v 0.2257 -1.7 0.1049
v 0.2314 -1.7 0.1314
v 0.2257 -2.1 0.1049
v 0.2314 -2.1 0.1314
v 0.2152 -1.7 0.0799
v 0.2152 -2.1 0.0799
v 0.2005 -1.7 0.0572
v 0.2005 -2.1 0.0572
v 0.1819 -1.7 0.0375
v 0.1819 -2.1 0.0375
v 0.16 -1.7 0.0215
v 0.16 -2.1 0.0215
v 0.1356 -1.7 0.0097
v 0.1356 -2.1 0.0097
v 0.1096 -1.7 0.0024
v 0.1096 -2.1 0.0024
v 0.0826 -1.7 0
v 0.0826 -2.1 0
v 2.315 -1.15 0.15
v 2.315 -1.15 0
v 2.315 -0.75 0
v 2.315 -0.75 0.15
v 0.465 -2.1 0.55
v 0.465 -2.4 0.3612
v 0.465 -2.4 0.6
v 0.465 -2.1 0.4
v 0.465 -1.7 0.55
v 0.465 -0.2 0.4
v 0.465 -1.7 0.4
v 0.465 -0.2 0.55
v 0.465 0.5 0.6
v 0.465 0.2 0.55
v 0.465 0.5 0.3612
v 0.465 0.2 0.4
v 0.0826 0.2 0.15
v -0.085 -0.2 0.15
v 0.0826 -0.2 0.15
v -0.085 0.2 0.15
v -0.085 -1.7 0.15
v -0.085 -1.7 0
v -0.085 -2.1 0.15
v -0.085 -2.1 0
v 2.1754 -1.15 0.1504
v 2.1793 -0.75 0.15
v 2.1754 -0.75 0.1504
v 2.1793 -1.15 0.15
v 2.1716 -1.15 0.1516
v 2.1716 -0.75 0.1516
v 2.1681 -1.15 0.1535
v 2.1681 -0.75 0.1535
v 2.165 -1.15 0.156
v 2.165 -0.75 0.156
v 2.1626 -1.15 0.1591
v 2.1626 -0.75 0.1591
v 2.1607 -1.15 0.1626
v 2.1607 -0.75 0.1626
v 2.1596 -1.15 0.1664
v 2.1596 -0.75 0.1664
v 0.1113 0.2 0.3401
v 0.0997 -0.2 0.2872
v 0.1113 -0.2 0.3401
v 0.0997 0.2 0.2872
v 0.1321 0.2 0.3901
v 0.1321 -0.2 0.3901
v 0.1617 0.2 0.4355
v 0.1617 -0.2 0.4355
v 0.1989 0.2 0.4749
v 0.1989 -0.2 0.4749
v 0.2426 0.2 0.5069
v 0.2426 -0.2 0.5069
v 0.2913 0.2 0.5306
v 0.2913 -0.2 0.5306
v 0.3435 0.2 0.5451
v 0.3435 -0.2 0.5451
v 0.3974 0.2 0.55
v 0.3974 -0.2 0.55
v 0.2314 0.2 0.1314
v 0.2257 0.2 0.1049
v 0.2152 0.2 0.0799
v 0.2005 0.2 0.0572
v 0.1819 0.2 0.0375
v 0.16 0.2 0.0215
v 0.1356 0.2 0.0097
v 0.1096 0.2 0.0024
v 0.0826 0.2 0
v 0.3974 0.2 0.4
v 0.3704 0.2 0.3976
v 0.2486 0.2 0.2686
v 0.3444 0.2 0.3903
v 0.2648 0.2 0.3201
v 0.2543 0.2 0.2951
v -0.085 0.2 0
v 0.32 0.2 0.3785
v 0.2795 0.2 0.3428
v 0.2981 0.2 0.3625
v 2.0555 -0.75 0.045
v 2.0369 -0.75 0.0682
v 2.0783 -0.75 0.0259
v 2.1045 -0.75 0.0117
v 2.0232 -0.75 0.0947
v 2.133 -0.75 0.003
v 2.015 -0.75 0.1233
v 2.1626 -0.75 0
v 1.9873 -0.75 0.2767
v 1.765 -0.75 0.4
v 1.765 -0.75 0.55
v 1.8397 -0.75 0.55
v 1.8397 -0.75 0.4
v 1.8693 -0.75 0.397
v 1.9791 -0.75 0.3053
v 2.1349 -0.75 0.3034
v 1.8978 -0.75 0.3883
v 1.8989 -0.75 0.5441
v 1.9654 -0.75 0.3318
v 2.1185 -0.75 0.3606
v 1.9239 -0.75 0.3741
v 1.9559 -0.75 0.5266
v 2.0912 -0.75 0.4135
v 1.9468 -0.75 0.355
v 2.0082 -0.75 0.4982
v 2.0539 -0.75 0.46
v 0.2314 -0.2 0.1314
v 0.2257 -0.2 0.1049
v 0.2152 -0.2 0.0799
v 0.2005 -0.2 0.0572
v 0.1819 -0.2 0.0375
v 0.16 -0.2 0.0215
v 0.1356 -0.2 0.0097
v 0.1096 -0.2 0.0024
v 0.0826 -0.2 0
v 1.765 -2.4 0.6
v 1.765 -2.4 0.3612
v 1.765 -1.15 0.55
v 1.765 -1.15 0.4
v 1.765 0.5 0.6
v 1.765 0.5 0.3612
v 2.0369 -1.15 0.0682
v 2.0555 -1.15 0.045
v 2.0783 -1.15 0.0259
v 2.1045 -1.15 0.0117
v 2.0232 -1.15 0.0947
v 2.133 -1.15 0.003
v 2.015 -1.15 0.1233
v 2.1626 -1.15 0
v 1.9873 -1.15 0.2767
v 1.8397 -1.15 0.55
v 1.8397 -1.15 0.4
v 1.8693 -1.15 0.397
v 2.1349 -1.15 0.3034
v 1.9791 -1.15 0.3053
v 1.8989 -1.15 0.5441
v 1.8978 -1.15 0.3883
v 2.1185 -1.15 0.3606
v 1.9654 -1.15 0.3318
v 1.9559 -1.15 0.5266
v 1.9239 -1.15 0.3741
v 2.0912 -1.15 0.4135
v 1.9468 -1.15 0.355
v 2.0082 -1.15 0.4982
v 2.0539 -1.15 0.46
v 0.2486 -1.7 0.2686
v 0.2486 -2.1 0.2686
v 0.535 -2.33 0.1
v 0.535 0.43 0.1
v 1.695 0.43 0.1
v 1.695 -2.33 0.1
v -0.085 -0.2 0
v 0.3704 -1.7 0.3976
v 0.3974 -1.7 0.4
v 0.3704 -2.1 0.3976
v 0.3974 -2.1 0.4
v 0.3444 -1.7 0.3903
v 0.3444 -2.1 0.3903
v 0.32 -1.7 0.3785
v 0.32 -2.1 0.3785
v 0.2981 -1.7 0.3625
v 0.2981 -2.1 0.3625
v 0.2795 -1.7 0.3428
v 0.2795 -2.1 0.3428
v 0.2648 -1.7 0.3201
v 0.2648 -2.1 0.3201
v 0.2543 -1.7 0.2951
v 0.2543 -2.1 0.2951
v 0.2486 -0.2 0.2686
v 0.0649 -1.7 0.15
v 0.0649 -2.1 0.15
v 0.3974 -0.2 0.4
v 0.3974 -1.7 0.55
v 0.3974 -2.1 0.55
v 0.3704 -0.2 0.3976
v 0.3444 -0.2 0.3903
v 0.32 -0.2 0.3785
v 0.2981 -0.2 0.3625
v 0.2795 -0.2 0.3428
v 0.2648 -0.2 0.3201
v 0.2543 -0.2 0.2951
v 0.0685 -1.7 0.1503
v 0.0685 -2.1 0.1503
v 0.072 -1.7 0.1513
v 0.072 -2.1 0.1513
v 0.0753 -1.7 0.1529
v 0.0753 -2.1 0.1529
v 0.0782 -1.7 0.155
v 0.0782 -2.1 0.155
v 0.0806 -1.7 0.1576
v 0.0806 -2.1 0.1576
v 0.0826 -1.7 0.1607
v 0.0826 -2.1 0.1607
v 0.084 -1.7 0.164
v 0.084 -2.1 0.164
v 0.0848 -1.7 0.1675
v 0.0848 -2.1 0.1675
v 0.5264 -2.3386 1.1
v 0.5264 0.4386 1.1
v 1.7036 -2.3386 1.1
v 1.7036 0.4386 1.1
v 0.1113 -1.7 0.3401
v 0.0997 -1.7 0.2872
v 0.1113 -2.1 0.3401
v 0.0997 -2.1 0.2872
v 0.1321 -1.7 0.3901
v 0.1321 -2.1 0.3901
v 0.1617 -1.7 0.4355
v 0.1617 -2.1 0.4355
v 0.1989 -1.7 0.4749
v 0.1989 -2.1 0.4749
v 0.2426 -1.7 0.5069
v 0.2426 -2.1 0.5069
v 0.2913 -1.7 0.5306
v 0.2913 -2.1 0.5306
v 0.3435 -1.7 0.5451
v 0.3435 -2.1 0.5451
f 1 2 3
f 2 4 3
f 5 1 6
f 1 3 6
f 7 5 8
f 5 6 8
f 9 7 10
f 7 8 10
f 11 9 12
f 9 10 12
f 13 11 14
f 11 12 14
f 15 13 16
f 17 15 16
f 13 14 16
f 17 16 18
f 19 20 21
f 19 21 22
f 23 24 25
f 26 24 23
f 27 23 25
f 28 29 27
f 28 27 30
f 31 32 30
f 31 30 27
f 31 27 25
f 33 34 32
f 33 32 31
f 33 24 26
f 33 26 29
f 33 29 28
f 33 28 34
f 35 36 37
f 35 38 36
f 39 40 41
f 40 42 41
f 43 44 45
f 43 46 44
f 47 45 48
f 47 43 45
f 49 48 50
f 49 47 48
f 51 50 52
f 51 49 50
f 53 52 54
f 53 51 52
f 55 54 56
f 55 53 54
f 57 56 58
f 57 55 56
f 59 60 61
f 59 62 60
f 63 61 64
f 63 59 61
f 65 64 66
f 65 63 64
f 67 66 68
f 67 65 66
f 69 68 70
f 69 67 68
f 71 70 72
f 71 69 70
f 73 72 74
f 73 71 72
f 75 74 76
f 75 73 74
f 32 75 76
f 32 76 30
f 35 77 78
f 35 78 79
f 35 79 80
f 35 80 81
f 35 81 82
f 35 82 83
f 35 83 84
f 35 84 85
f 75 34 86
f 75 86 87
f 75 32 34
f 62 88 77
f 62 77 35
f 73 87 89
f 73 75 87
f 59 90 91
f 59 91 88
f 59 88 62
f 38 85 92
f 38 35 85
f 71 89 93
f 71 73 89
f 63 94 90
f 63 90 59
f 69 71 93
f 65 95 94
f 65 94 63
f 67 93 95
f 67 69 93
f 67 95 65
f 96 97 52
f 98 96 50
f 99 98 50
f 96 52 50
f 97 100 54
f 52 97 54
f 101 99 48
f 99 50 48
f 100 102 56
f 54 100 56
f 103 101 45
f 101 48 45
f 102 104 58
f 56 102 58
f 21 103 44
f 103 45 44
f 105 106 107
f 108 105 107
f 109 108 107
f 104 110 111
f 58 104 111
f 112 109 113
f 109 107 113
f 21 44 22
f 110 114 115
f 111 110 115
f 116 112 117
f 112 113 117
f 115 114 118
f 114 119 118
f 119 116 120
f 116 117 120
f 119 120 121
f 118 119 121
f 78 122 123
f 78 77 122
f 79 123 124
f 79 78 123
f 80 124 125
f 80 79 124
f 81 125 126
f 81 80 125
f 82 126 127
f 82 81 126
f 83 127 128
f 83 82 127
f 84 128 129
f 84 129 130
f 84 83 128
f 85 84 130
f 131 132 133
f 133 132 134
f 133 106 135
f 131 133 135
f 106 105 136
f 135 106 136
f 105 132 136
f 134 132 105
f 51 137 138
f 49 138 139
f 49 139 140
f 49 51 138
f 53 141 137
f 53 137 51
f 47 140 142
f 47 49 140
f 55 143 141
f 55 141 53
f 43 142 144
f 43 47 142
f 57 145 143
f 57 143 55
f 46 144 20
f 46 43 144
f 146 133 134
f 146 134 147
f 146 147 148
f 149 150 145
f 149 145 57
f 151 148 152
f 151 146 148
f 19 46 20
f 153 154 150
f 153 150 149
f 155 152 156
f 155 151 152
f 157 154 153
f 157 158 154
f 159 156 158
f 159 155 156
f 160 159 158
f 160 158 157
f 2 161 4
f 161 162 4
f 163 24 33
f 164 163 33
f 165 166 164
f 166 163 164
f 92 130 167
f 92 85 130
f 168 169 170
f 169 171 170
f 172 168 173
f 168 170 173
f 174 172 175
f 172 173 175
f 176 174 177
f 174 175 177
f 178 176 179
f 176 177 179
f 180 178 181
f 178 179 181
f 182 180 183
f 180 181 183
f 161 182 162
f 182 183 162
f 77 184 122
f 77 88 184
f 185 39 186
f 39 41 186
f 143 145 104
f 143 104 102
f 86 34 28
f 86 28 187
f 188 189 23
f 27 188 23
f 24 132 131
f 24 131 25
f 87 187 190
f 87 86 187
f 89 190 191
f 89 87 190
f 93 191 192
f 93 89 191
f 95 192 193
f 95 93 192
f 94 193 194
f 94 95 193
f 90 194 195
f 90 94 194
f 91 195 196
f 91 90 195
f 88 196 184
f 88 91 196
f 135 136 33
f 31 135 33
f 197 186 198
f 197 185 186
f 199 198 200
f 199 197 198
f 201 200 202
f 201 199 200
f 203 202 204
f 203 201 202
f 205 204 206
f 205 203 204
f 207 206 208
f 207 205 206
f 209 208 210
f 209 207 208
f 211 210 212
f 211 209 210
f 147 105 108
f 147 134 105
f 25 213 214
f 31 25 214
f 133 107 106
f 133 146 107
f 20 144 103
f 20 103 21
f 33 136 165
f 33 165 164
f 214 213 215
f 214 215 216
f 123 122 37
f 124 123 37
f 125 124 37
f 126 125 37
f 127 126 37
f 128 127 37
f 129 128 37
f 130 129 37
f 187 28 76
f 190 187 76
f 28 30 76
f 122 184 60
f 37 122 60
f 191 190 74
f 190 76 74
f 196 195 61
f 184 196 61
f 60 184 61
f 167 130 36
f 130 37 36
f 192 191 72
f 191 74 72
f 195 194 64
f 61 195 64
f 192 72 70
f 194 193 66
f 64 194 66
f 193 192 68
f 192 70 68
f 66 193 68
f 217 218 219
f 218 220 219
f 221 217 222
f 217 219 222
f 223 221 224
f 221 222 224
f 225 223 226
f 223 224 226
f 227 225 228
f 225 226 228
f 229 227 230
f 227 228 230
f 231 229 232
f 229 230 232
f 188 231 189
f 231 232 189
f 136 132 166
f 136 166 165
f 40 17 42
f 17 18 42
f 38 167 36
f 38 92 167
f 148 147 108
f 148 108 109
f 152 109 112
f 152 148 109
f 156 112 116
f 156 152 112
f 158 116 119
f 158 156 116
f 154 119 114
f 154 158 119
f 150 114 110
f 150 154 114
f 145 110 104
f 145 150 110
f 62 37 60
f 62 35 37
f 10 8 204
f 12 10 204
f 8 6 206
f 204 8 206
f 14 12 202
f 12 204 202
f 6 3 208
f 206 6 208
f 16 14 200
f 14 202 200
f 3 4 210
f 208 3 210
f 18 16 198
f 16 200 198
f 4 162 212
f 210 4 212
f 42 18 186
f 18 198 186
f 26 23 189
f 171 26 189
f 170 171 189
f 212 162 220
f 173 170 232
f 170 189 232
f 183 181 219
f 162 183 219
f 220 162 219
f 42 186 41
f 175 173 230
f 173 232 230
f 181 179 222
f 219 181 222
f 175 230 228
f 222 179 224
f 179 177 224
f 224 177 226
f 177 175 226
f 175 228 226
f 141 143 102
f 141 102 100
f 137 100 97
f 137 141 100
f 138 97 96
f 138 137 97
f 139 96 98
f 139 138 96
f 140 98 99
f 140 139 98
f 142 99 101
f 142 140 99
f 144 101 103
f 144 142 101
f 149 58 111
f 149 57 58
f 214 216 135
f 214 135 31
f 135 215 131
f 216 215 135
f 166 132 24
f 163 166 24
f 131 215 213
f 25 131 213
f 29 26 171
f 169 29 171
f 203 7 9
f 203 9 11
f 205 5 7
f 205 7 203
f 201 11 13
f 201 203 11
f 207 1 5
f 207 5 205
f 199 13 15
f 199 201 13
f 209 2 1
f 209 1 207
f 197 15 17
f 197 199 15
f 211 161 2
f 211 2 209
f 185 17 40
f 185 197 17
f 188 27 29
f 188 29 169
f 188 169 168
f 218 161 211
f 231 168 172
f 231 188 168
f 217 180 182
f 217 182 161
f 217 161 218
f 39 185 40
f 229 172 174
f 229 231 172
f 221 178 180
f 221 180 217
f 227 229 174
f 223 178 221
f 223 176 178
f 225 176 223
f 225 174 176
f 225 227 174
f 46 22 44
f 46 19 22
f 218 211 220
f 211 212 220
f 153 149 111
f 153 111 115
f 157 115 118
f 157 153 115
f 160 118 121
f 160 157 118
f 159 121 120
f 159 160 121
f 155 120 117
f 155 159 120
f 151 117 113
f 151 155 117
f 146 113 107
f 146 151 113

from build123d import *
from OCP.BRepFilletAPI import BRepFilletAPI_MakeChamfer

# Parameters (mm, degrees)
SKETCH_1_W        = 2.9
SKETCH_1_H        = 1.3
EXTRUDE_1_DEPTH   = 1
EXTRUDE_2_DEPTH   = 0.2
EXTRUDE_3_DEPTH   = 0.2
FILLET_1_R        = 0.02
CHAMFER_1_SIZE    = 0.5
CHAMFER_1_SIZE2   = 0.06139228
CHAMFER_2_SIZE    = 0.07
CHAMFER_2_SIZE2   = 0.261243557
MOVE_BODY_1_ANGLE = 120


with BuildPart() as part:
    # Эскиз1 → Бобышка-Вытянуть1 (new body)
    with BuildSketch(Plane(origin=(0, -0.1, 0), x_dir=(-1, 0, 0), z_dir=(0, 1, 0))):
        Rectangle(SKETCH_1_W, SKETCH_1_H)
    extrude(amount=EXTRUDE_1_DEPTH)

    # Эскиз3 → Вытянуть-Тонкостенный2 (add, symmetric)
    with BuildSketch(Plane(origin=(0, 0, 0), x_dir=(0, 0, -1), z_dir=(1, 0, 0))):
        with BuildLine():
            Line((0.65, 0.2), (0.724677848, 0.2))
            ThreePointArc((0.724677848, 0.2), (0.820851333, 0.165111515), (0.872286855, 0.076675477))
            Line((0.872286855, 0.076675477), (0.9, -0.076675477))
            ThreePointArc((0.9, -0.076675477), (0.951435522, -0.165111515), (1.047609007, -0.2))
            Line((1.047609007, -0.2), (1.2, -0.2))
            Line((1.2, -0.2), (1.2, -0.05))
            Line((1.2, -0.05), (1.047609007, -0.05))
            Line((1.047609007, -0.05), (1.019895862, 0.103350954))
            ThreePointArc((1.019895862, 0.103350954), (0.917024818, 0.280223029), (0.724677848, 0.35))
            Line((0.724677848, 0.35), (0.65, 0.35))
            Line((0.65, 0.35), (0.65, 0.2))
        make_face()
    extrude(amount=EXTRUDE_2_DEPTH, both=True)

    # Эскиз4 → Вытянуть-Тонкостенный3 (add, symmetric)
    with BuildSketch(Plane(origin=(0.95, 0, 0), x_dir=(0, 0, -1), z_dir=(1, 0, 0))):
        with BuildLine():
            Line((-0.65, 0.2), (-0.717582667, 0.2))
            ThreePointArc((-0.717582667, 0.2), (-0.816853052, 0.162451726), (-0.866424349, 0.06860521))
            Line((-0.866424349, 0.06860521), (-0.883575651, -0.06860521))
            ThreePointArc((-0.883575651, -0.06860521), (-0.933146948, -0.162451726), (-1.032417333, -0.2))
            Line((-1.032417333, -0.2), (-1.2, -0.2))
            Line((-1.2, -0.2), (-1.2, -0.05))
            Line((-1.2, -0.05), (-1.032417333, -0.05))
            Line((-1.032417333, -0.05), (-1.01526603, 0.08721042))
            ThreePointArc((-1.01526603, 0.08721042), (-0.916123436, 0.274903453), (-0.717582667, 0.35))
            Line((-0.717582667, 0.35), (-0.65, 0.35))
            Line((-0.65, 0.35), (-0.65, 0.2))
        make_face()
    extrude_3 = extrude(amount=EXTRUDE_3_DEPTH, both=True)

    # Скругление1
    fillet_1_edges = [part.edges().sort_by_distance(p)[0] for p in [
        (0, -0.05, -1.047609007),
        (0.95, -0.05, 1.032417333),
    ]]
    fillet(fillet_1_edges, radius=FILLET_1_R)

    # Зеркальное отражение1: Вытянуть-Тонкостенный3 across plane
    add(extrude_3.mirror(Plane(origin=(0, 0, 0), x_dir=(0, 0, 1), z_dir=(1, 0, 0))))

    # Фаска1: one chamfer whose edges measure the first distance from different faces: ONE call of the kernel's chamfer builder (chamfer() names one face for all edges)
    chamfer_1_edges_1 = [part.edges().sort_by_distance(p)[0] for p in [
        (1.45, 0.9, 0),
    ]]
    chamfer_1_side_1 = [part.faces().sort_by_distance(p)[0] for p in [
        (1.45, 0.4, 0),
    ]]
    chamfer_1_edges_2 = [part.edges().sort_by_distance(p)[0] for p in [
        (0, 0.9, -0.65),
    ]]
    chamfer_1_side_2 = [part.faces().sort_by_distance(p)[0] for p in [
        (0, 0.402640845, -0.65),
    ]]
    chamfer_1_edges_3 = [part.edges().sort_by_distance(p)[0] for p in [
        (-1.45, 0.9, 0),
    ]]
    chamfer_1_side_3 = [part.faces().sort_by_distance(p)[0] for p in [
        (-1.45, 0.4, 0),
    ]]
    chamfer_1_edges_4 = [part.edges().sort_by_distance(p)[0] for p in [
        (0, 0.9, 0.65),
    ]]
    chamfer_1_side_4 = [part.faces().sort_by_distance(p)[0] for p in [
        (0, 0.405395683, 0.65),
    ]]
    chamfer_1 = BRepFilletAPI_MakeChamfer(part.part.solid().wrapped)
    for e in chamfer_1_edges_1:
        chamfer_1.Add(CHAMFER_1_SIZE, CHAMFER_1_SIZE2, e.wrapped, chamfer_1_side_1[0].wrapped)  # the first distance lies on this face
    for e in chamfer_1_edges_2:
        chamfer_1.Add(CHAMFER_1_SIZE, CHAMFER_1_SIZE2, e.wrapped, chamfer_1_side_2[0].wrapped)  # the first distance lies on this face
    for e in chamfer_1_edges_3:
        chamfer_1.Add(CHAMFER_1_SIZE, CHAMFER_1_SIZE2, e.wrapped, chamfer_1_side_3[0].wrapped)  # the first distance lies on this face
    for e in chamfer_1_edges_4:
        chamfer_1.Add(CHAMFER_1_SIZE, CHAMFER_1_SIZE2, e.wrapped, chamfer_1_side_4[0].wrapped)  # the first distance lies on this face
    add(Compound.cast(chamfer_1.Shape()), mode=Mode.REPLACE)

    # Фаска2
    chamfer_2_edges = [part.edges().sort_by_distance(p)[0] for p in [
        (0, -0.1, -0.65),
        (1.45, -0.1, 0),
        (0, -0.1, 0.65),
        (-1.45, -0.1, 0),
    ]]
    chamfer_2_side = [part.faces().sort_by_distance(p)[0] for p in [
        (0, -0.1, 0),
    ]]
    chamfer(chamfer_2_edges, length=CHAMFER_2_SIZE, length2=CHAMFER_2_SIZE2, reference=chamfer_2_side[0])


with BuildPart() as part_1:
    # Move Body 1: read off the stored shape, not the designer's step
    # Move Body 1: moved
    add(part.part.moved(Location((0.95, 0.2, -1.115))).rotate(Axis((0, 0, 0), (0.5773502692, -0.5773502692, -0.5773502692)), MOVE_BODY_1_ANGLE))


solid = part_1.part
